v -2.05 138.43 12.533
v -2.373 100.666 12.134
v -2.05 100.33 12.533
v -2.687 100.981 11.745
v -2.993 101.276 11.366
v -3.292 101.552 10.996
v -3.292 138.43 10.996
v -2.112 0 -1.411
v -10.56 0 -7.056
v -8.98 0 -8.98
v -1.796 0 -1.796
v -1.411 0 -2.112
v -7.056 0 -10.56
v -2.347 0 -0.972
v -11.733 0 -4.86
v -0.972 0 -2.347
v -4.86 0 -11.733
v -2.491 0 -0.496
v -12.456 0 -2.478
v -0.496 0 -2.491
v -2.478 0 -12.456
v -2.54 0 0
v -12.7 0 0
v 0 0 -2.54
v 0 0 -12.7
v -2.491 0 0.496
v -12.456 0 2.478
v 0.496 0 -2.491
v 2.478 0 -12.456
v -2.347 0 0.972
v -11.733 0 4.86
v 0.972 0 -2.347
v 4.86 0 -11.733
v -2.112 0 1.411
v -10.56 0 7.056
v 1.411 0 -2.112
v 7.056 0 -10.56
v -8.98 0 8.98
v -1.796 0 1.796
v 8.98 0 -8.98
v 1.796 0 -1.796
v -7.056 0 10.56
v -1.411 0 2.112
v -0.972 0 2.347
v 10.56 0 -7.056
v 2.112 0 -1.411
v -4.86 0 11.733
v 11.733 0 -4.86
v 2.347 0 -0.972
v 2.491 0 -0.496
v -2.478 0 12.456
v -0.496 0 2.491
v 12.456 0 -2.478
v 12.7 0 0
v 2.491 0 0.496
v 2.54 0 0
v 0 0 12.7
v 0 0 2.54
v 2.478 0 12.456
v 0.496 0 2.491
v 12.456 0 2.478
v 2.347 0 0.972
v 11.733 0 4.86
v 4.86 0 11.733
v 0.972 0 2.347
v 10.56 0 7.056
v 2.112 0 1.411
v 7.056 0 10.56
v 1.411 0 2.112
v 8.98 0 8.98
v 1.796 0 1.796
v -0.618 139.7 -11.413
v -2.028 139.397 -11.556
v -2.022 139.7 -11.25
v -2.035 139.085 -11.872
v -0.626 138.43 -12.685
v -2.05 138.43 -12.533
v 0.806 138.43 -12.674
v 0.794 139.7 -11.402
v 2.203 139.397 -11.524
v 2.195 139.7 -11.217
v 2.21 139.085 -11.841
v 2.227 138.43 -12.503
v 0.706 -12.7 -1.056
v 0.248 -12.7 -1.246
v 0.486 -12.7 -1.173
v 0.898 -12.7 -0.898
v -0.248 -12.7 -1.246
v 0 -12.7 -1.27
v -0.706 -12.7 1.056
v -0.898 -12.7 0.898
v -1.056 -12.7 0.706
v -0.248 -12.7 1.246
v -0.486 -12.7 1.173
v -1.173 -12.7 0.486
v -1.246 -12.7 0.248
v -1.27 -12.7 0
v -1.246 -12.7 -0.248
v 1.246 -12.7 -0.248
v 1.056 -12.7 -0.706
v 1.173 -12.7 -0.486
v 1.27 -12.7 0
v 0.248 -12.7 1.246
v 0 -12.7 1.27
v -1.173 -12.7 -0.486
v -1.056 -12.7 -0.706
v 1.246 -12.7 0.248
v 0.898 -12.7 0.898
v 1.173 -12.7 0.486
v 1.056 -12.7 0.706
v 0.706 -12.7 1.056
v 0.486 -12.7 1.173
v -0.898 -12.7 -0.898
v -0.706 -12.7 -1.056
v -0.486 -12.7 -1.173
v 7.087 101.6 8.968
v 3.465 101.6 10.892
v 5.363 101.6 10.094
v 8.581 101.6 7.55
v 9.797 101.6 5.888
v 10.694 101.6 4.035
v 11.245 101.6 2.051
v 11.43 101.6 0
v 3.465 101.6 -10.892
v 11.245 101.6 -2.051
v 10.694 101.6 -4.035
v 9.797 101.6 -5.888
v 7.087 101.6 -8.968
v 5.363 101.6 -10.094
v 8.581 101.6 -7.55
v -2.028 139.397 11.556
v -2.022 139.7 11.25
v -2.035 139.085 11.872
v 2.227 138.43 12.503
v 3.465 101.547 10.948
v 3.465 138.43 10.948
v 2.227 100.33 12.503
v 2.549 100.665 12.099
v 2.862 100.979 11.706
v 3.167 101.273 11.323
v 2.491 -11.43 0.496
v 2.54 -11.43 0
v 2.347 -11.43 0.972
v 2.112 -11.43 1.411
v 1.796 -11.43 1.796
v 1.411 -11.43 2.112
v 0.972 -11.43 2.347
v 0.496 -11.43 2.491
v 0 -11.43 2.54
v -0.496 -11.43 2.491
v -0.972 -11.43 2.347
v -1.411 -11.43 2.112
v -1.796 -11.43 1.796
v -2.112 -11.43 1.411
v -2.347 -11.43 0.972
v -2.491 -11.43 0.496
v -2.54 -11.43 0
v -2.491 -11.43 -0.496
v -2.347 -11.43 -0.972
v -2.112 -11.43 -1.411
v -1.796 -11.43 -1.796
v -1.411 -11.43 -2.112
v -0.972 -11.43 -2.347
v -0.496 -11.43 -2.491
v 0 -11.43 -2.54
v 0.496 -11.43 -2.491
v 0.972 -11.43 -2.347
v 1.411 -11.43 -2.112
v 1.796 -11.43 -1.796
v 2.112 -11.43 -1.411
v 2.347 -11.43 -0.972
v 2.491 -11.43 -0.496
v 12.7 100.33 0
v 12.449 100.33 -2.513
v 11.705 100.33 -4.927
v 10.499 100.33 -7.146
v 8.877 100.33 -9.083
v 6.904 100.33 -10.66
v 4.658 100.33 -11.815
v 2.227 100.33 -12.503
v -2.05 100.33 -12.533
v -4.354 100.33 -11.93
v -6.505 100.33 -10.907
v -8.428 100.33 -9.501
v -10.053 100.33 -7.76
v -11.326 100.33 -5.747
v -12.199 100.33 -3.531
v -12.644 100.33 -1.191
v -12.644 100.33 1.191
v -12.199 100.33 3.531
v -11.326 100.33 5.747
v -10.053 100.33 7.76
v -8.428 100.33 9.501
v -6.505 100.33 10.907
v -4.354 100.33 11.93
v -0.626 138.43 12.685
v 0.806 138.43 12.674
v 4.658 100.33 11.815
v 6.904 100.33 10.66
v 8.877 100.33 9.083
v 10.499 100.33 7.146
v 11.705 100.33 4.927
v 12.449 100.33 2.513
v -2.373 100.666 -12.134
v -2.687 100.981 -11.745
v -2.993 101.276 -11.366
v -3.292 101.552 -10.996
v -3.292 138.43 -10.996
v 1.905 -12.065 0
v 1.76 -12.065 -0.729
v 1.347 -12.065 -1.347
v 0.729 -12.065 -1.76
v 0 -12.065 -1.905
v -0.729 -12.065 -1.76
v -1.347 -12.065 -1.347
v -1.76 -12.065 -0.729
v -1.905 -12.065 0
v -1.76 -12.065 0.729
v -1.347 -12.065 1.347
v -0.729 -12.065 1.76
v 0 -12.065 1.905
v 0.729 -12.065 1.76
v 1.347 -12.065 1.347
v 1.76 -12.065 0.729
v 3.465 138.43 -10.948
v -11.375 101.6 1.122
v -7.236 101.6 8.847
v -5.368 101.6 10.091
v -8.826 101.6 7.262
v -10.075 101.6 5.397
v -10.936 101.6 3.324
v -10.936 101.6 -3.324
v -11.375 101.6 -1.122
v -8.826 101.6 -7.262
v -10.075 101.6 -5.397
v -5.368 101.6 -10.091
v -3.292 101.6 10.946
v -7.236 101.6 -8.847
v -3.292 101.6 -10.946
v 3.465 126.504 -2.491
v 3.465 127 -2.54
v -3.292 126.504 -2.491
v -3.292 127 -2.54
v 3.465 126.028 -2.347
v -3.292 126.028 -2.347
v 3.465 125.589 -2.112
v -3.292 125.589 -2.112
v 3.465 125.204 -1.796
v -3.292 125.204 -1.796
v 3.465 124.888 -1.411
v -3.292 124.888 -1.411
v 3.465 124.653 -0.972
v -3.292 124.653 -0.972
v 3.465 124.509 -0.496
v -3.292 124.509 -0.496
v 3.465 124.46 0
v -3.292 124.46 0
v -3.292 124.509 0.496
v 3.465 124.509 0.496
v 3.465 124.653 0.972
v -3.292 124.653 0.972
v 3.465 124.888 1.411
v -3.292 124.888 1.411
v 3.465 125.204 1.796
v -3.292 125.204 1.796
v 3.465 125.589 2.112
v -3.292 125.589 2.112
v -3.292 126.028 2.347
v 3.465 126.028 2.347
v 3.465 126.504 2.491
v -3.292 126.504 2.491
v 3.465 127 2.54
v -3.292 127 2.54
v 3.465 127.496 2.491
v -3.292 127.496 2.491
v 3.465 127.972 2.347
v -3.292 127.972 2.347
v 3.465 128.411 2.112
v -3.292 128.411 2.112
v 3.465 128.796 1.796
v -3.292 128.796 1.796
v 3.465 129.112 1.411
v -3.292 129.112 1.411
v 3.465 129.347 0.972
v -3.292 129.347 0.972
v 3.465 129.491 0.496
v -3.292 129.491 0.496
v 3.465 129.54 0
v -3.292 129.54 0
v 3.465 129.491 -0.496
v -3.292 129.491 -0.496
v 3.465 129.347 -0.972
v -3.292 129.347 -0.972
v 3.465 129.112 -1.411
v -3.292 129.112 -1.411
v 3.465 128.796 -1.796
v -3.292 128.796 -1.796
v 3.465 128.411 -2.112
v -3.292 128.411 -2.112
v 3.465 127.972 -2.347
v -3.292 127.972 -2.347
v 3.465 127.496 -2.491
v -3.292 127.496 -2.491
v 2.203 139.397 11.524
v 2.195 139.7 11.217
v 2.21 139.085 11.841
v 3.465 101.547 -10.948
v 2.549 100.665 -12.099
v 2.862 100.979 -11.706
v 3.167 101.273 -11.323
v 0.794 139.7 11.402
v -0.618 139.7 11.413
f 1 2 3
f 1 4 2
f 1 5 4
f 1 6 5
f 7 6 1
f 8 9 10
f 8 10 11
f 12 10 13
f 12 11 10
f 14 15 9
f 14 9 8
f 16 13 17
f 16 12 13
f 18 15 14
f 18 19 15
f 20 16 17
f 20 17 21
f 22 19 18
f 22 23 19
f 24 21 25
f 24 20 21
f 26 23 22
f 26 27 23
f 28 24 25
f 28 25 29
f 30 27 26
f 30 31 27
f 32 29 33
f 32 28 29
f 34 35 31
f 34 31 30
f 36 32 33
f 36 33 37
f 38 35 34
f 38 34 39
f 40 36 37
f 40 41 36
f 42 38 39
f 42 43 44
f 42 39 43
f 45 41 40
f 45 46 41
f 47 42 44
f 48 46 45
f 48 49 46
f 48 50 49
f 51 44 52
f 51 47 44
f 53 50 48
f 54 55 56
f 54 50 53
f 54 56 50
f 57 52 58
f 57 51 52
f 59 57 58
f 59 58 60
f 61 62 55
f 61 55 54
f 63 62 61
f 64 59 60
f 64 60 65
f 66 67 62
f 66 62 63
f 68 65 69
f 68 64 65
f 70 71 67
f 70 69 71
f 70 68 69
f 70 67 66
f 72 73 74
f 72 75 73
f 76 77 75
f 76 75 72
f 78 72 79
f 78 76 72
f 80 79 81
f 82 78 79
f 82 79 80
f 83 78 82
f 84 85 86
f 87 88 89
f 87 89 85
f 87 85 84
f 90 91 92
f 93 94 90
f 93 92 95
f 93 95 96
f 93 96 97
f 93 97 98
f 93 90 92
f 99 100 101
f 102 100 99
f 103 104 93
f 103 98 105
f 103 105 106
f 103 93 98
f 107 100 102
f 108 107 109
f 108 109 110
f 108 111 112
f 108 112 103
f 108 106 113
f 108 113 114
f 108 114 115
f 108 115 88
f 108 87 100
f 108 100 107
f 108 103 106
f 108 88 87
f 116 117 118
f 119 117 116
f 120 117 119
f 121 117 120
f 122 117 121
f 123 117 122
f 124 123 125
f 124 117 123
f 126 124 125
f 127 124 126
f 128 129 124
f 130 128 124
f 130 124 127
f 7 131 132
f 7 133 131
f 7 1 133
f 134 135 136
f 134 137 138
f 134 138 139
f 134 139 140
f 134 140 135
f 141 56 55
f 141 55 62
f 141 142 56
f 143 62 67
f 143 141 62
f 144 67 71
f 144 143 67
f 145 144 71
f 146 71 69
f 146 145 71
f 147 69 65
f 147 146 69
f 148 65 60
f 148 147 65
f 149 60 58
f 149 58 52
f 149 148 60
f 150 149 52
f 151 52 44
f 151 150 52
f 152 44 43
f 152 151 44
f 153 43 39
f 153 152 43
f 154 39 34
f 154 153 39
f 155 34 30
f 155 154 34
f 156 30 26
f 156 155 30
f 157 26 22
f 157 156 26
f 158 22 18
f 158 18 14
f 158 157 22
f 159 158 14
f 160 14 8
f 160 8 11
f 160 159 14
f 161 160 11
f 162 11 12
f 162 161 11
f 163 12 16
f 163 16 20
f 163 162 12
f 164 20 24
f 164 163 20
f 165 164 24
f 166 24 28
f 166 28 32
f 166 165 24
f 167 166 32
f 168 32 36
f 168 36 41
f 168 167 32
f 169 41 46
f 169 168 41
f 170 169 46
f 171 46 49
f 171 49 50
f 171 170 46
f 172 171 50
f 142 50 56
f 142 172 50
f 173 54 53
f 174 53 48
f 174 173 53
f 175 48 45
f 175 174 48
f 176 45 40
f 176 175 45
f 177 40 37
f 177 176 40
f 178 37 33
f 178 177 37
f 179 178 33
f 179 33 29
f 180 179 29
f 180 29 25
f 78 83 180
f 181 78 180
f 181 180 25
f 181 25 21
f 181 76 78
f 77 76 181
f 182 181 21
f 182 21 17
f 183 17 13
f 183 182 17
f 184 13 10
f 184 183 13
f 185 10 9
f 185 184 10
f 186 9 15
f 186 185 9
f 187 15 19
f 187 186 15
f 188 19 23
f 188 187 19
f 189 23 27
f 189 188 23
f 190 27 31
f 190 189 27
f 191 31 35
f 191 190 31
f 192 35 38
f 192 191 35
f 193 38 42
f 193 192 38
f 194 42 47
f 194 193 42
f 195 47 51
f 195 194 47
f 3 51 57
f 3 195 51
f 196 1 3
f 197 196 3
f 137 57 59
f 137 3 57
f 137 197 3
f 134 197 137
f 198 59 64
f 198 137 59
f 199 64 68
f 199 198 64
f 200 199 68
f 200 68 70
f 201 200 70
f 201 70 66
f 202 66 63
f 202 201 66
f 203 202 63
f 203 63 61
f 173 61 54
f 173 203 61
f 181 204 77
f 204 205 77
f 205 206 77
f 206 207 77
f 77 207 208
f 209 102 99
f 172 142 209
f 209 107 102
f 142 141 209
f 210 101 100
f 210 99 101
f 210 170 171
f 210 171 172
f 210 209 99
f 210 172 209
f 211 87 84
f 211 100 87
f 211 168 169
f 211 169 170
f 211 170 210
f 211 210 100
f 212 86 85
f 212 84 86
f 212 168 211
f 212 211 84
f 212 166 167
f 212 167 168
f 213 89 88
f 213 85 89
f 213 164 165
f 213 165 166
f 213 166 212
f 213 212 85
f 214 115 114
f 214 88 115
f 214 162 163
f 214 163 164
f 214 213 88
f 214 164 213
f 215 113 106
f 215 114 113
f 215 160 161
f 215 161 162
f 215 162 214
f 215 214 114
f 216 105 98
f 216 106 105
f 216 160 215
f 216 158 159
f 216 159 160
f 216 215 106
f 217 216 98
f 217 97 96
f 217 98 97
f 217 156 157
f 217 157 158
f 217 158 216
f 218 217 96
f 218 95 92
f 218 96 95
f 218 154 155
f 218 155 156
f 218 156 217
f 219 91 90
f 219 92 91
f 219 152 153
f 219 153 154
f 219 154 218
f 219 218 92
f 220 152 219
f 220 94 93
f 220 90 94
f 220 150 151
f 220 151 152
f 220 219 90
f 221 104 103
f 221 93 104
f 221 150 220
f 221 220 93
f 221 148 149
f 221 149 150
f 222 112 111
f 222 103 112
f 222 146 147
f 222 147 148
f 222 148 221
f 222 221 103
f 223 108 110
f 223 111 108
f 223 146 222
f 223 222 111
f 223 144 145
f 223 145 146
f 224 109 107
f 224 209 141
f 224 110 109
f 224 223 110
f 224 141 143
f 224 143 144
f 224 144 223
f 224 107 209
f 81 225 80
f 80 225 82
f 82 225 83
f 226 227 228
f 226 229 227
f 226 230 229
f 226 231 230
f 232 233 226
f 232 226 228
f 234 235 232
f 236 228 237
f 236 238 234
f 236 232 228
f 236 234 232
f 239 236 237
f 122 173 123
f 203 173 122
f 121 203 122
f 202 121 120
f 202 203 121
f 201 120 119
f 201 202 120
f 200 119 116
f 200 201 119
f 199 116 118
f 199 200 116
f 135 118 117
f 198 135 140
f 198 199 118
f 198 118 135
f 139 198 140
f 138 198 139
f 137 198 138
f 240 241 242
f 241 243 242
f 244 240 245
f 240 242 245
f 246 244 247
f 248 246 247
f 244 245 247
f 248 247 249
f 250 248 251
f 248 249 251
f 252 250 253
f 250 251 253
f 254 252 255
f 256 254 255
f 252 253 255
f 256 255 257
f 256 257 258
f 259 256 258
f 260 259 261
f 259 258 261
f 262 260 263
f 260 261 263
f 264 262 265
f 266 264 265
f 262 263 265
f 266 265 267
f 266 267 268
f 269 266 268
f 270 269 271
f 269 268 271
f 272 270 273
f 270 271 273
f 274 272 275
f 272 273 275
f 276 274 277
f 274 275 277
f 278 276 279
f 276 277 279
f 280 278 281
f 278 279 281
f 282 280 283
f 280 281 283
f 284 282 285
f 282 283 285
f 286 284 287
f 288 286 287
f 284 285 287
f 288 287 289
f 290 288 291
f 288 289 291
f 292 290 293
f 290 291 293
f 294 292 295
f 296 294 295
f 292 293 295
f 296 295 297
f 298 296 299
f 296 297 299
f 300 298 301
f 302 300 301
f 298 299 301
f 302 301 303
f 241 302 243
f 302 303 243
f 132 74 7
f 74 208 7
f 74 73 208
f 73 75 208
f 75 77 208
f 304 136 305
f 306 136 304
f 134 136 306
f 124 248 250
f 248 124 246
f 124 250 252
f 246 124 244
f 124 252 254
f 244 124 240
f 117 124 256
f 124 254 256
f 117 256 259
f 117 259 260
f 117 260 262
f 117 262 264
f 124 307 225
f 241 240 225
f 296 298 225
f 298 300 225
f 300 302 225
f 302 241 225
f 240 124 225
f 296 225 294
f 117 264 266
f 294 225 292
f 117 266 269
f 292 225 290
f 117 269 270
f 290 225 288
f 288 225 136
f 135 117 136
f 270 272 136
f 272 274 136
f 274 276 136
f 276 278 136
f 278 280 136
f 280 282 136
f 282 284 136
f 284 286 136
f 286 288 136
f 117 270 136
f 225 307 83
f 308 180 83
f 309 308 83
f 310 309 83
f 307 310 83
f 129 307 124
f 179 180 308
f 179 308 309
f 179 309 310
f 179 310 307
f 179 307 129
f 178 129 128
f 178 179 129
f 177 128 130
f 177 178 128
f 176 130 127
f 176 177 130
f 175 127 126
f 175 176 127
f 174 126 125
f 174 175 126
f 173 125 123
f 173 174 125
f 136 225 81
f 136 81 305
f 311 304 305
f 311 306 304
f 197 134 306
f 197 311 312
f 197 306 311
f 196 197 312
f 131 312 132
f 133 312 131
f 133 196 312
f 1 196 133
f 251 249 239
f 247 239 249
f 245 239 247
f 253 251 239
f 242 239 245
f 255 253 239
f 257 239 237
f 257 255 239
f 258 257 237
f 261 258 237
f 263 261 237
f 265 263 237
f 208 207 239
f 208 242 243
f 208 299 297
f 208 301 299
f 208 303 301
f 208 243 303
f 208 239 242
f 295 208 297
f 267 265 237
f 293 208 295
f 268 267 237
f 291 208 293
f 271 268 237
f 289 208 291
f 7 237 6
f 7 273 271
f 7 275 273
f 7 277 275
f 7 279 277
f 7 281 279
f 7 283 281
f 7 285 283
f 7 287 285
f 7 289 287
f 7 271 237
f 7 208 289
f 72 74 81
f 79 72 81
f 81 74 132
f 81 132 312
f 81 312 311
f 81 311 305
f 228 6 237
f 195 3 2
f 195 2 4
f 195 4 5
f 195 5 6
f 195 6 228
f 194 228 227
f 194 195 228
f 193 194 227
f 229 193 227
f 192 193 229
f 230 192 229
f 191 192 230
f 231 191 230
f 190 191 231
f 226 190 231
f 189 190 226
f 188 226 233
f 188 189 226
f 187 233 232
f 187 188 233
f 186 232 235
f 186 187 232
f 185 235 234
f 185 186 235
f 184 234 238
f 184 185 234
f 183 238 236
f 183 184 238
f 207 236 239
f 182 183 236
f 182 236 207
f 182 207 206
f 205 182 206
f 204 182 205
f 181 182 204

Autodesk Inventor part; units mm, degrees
ref_plane "YZ Plane" through (0, 0, 0) normal (1, 0, 0) x (0, 1, 0)
ref_plane "XZ Plane" through (0, 0, 0) normal (0, 1, 0) x (-1, 0, 0)
ref_plane "XY Plane" through (0, 0, 0) normal (0, 0, 1) x (1, 0, 0)
sketch "Sketch1" plane through (0, 0, 0) normal (0, 0, 1) x (1, 0, 0)
  line L0 (0, 0) -> (12.7, 0)
  line L1 (12.7, 0) -> (12.7, 139.7)
  line L2 (12.7, 139.7) -> (0, 139.7)
  line L3 (0, 139.7) -> (0, 0)
  line L4 (0, 0) -> (2.54, 0)
  line L5 (2.54, 0) -> (2.54, -12.7)
  line L6 (2.54, -12.7) -> (0, -12.7)
  line L7 (0, -12.7) -> (0, 0)
  dimension "d0" = 12.7
  dimension "d1" = 139.7
  dimension "d2" = 12.7
  dimension "d3" = 2.54
revolve "Revolution1" add sketch "Sketch1" angle 360 about axis through (0, 139.7, 0) along (0, -1, 0)
sketch "Sketch4" plane through (0, 139.7, 0) normal (0, 1, 0) x (1, 0, 0)
  line L0 (3.175, -12.7) -> (3.175, 12.7)
  line L1 (3.175, 12.7) -> (-3.175, 12.7)
  line L2 (-3.175, 12.7) -> (-3.175, -12.7)
  line L3 (-3.175, -12.7) -> (3.175, -12.7)
  line L4 (3.175, -12.7) -> (-3.175, 12.7) construction
  line L5 (3.175, 12.7) -> (-3.175, -12.7) construction
  point P0 (0, 0)
  dimension "d24" = 6.35
  dimension "d25" = 25.4
sketch "Sketch5" plane through (0, 139.7, 0) normal (0, 1, 0) x (1, 0, 0)
  line L0 (-3.2918, -12.7) -> (-12.7, -12.7)
  line L1 (-12.7, -12.7) -> (-12.7, 12.7)
  line L2 (-12.7, 12.7) -> (-3.2918, 12.7)
  line L3 (-3.2918, 12.7) -> (-3.2918, -12.7)
  line L4 (3.4651, -12.7) -> (12.7, -12.7)
  line L5 (12.7, -12.7) -> (12.7, 12.7)
  line L6 (12.7, 12.7) -> (3.4651, 12.7)
  line L7 (3.4651, 12.7) -> (3.4651, -12.7)
  point P0 (0, 0)
extrude "Extrusion2" cut sketch "Sketch5" against normal blind 38.1
sketch "Sketch6" plane through (3.4651, 139.7, 12.2181) normal (1, 0, 0) x (0, 0, -1)
  line L0 (-0.4819, -139.7) -> (24.9181, -139.7) projected
  point P0 (12.2181, -139.7)
  point P1 (12.2181, -12.7)
  dimension "d28" = 127
hole "Hole2" at (3.4651, 127, 0) direction (-1, 0, 0) diameter 5.08 end through all
chamfer "Chamfer3" distance 1.27 angle 45 12 edges at (10.1316, 101.6, -7.6578) (10.1316, 101.6, 7.6578) (3.4651, 120.65, -12.2181) (3.4651, 120.65, 12.2181) (3.4651, 139.7, 0) (0.0899, 139.7, -12.6997) (0.0899, 139.7, 12.6997) (-3.2918, 139.7, 0) (-3.2918, 120.65, -12.266) (-3.2918, 120.65, 12.266) (-12.7, 101.6, 0) (-2.54, -12.7, 0)
properties part number "2016.06.13 height guide"
